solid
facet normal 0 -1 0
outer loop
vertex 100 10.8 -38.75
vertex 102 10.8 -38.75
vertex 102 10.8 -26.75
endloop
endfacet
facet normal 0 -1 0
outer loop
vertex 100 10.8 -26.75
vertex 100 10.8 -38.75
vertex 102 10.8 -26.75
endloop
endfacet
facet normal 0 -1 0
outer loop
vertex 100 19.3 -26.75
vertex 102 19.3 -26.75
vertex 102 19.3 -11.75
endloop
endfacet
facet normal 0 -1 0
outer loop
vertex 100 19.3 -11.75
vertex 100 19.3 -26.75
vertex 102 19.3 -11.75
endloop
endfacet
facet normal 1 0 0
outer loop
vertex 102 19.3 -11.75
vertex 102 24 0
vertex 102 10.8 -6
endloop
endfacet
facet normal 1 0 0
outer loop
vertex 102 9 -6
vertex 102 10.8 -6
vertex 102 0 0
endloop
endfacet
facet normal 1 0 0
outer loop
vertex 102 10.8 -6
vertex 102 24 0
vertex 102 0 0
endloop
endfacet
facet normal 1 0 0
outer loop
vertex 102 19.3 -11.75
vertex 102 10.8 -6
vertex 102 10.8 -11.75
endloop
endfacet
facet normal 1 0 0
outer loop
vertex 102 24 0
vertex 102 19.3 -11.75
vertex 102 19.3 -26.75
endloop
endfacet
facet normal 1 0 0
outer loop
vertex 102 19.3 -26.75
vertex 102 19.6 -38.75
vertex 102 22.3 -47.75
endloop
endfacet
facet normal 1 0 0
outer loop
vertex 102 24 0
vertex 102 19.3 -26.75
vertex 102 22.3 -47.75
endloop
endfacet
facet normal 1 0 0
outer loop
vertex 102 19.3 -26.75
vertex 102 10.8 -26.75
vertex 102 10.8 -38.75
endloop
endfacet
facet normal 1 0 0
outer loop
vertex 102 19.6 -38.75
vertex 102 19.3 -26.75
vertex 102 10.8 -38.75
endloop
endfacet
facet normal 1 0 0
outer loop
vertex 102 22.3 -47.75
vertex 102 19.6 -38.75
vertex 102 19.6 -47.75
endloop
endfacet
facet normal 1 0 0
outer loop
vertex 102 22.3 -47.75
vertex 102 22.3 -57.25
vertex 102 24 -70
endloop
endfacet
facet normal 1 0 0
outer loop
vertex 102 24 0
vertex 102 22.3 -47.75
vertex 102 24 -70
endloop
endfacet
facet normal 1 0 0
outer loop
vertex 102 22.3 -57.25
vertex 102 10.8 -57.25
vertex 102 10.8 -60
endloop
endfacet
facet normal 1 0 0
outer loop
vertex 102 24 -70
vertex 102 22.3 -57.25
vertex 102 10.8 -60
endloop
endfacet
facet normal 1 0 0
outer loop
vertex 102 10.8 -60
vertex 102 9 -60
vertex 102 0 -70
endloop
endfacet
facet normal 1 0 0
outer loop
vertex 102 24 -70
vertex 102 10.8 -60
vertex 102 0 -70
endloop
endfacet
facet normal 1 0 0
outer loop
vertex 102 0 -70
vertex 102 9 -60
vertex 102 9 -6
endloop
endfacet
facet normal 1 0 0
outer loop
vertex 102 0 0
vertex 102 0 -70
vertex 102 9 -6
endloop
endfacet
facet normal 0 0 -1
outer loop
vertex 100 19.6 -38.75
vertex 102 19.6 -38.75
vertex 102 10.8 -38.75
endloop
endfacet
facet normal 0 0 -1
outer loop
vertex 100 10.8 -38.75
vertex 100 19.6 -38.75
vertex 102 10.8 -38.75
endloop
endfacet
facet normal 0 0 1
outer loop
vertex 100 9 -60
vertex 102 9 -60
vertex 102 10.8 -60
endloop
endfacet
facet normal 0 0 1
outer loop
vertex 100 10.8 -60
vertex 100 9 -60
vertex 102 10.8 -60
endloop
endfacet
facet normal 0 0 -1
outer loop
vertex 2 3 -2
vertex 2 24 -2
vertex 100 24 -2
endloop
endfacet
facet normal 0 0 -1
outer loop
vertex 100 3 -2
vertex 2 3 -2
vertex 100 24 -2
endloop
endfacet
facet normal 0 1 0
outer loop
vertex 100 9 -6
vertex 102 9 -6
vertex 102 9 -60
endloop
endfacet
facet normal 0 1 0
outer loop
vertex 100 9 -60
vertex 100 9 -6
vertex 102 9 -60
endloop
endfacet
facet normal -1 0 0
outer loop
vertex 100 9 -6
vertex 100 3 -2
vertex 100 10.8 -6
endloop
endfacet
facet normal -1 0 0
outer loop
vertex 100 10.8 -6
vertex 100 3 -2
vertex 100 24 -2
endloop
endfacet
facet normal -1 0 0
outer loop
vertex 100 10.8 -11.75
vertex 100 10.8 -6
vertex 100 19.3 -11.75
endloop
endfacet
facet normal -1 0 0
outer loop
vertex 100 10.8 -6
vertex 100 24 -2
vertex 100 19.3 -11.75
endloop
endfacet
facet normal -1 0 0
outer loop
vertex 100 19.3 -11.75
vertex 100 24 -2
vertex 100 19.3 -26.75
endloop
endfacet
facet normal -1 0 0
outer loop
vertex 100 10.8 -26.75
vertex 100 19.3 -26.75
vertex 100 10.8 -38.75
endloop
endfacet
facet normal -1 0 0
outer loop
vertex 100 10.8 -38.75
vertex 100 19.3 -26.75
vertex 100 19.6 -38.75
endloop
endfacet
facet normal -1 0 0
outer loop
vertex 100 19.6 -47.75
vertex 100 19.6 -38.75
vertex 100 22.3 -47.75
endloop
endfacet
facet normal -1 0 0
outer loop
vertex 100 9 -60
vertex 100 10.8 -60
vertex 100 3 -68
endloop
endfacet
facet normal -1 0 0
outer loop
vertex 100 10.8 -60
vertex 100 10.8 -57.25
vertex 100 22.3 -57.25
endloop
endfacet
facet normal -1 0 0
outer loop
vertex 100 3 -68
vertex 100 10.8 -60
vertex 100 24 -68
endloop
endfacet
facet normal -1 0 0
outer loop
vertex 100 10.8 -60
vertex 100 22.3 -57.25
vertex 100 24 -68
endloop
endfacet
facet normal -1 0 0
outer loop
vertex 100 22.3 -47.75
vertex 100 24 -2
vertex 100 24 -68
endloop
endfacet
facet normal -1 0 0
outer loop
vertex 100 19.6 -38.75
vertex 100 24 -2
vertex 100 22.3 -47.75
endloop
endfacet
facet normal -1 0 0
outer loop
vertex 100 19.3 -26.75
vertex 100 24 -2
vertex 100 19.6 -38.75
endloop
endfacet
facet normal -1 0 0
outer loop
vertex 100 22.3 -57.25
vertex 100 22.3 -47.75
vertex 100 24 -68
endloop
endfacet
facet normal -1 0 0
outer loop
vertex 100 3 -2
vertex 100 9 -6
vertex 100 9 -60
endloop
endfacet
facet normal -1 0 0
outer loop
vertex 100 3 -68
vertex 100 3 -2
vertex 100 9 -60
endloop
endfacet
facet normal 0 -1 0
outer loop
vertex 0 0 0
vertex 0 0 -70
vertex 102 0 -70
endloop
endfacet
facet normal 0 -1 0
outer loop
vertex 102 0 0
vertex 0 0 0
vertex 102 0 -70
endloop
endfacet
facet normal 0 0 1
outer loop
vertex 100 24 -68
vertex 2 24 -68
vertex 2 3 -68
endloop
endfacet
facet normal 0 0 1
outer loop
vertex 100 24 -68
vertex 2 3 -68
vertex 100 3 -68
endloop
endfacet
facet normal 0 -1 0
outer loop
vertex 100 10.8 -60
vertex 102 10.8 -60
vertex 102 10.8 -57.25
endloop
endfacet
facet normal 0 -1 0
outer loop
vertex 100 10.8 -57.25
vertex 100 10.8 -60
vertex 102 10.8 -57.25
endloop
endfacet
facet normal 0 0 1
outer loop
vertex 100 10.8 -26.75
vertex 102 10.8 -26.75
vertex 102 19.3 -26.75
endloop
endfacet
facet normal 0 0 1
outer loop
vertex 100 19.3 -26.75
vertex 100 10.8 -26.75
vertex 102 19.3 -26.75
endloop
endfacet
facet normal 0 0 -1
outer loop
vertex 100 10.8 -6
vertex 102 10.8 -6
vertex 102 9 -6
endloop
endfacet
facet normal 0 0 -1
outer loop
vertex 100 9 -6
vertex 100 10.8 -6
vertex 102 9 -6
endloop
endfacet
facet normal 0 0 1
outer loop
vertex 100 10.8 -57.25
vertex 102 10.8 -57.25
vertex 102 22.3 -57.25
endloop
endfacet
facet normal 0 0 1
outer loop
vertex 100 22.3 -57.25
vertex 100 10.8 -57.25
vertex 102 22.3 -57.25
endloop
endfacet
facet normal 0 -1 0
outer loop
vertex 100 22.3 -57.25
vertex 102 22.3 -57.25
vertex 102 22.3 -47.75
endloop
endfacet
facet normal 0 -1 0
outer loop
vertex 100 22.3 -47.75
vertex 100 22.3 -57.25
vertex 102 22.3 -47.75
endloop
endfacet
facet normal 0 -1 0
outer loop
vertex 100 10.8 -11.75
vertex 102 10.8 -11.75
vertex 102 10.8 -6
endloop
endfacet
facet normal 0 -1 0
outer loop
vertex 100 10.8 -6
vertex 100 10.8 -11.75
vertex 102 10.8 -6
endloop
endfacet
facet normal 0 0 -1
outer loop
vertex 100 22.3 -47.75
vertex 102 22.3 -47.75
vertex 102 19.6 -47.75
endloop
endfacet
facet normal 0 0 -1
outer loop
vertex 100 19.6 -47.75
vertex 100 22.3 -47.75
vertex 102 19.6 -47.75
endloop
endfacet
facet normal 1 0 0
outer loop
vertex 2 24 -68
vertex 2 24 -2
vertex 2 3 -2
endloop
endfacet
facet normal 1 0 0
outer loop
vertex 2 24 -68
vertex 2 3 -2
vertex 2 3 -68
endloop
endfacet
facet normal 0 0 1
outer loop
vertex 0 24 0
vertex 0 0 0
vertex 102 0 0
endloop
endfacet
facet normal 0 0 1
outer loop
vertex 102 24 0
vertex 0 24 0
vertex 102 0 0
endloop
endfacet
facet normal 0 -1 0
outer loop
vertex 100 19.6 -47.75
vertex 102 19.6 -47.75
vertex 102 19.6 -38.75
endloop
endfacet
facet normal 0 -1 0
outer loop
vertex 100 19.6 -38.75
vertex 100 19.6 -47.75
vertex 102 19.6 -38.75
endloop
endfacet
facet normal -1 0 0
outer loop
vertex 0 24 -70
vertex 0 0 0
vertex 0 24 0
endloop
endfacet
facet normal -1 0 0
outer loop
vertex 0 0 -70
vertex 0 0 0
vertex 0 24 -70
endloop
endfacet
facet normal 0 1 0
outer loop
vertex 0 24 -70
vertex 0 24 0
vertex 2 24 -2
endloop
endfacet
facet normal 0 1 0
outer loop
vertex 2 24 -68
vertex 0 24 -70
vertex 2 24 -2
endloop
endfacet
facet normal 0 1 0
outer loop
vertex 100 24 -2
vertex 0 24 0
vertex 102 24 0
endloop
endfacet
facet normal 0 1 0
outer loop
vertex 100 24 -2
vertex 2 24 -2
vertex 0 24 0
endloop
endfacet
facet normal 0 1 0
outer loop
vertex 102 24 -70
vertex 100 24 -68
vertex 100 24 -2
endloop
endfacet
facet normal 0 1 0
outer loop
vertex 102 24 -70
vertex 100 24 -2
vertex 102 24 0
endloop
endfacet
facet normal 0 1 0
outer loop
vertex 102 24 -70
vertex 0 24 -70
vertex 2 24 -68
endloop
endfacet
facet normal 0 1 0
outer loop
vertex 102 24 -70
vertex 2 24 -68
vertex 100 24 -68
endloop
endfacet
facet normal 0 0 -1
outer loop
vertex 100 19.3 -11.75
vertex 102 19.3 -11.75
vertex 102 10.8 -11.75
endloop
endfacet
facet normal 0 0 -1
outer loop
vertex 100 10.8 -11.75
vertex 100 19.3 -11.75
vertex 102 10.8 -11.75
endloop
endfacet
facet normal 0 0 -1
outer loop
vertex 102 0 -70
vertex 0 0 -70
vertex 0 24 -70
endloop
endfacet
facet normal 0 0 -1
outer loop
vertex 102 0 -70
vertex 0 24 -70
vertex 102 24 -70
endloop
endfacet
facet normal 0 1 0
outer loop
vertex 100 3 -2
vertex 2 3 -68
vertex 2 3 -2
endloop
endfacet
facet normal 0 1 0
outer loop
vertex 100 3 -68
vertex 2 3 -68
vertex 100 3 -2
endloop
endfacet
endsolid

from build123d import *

# Parameters (mm, degrees)
CROQUIS1_W              = 102
CROQUIS1_H              = 70
SALIENTE_EXTRUIR1_DEPTH = 24
CROQUIS2_W              = 98
CROQUIS2_H              = 66
CORTAR_EXTRUIR1_DEPTH   = 21
CORTAR_EXTRUIR2_DEPTH   = 2


with BuildPart() as part:
    # Croquis1 → Saliente-Extruir1 (new body)
    with BuildSketch(Plane(origin=(0, 0, 0), x_dir=(1, 0, 0), z_dir=(0, 1, 0))):
        with Locations((51, 35)):
            Rectangle(CROQUIS1_W, CROQUIS1_H)
    extrude(amount=SALIENTE_EXTRUIR1_DEPTH)

    # Croquis2 → Cortar-Extruir1 (cut)
    with BuildSketch(Plane(origin=(0, 24, 0), x_dir=(1, 0, 0), z_dir=(0, 1, 0))):
        with Locations((51, 35)):
            Rectangle(CROQUIS2_W, CROQUIS2_H)
    extrude(amount=-CORTAR_EXTRUIR1_DEPTH, mode=Mode.SUBTRACT)

    # Croquis3 → Cortar-Extruir2 (cut)
    with BuildSketch(Plane(origin=(102, 0, 0), x_dir=(0, 0, -1), z_dir=(1, 0, 0))):
        Polygon((6, 9), (60, 9), (60, 10.8), (57.25, 10.8), (57.25, 22.3), (47.75, 22.3), (47.75, 19.6), (38.75, 19.6), (38.75, 10.8), (26.75, 10.8), (26.75, 19.3), (11.75, 19.3), (11.75, 10.8), (6, 10.8), align=None)
    extrude(amount=-CORTAR_EXTRUIR2_DEPTH, mode=Mode.SUBTRACT)


solid = part.part
